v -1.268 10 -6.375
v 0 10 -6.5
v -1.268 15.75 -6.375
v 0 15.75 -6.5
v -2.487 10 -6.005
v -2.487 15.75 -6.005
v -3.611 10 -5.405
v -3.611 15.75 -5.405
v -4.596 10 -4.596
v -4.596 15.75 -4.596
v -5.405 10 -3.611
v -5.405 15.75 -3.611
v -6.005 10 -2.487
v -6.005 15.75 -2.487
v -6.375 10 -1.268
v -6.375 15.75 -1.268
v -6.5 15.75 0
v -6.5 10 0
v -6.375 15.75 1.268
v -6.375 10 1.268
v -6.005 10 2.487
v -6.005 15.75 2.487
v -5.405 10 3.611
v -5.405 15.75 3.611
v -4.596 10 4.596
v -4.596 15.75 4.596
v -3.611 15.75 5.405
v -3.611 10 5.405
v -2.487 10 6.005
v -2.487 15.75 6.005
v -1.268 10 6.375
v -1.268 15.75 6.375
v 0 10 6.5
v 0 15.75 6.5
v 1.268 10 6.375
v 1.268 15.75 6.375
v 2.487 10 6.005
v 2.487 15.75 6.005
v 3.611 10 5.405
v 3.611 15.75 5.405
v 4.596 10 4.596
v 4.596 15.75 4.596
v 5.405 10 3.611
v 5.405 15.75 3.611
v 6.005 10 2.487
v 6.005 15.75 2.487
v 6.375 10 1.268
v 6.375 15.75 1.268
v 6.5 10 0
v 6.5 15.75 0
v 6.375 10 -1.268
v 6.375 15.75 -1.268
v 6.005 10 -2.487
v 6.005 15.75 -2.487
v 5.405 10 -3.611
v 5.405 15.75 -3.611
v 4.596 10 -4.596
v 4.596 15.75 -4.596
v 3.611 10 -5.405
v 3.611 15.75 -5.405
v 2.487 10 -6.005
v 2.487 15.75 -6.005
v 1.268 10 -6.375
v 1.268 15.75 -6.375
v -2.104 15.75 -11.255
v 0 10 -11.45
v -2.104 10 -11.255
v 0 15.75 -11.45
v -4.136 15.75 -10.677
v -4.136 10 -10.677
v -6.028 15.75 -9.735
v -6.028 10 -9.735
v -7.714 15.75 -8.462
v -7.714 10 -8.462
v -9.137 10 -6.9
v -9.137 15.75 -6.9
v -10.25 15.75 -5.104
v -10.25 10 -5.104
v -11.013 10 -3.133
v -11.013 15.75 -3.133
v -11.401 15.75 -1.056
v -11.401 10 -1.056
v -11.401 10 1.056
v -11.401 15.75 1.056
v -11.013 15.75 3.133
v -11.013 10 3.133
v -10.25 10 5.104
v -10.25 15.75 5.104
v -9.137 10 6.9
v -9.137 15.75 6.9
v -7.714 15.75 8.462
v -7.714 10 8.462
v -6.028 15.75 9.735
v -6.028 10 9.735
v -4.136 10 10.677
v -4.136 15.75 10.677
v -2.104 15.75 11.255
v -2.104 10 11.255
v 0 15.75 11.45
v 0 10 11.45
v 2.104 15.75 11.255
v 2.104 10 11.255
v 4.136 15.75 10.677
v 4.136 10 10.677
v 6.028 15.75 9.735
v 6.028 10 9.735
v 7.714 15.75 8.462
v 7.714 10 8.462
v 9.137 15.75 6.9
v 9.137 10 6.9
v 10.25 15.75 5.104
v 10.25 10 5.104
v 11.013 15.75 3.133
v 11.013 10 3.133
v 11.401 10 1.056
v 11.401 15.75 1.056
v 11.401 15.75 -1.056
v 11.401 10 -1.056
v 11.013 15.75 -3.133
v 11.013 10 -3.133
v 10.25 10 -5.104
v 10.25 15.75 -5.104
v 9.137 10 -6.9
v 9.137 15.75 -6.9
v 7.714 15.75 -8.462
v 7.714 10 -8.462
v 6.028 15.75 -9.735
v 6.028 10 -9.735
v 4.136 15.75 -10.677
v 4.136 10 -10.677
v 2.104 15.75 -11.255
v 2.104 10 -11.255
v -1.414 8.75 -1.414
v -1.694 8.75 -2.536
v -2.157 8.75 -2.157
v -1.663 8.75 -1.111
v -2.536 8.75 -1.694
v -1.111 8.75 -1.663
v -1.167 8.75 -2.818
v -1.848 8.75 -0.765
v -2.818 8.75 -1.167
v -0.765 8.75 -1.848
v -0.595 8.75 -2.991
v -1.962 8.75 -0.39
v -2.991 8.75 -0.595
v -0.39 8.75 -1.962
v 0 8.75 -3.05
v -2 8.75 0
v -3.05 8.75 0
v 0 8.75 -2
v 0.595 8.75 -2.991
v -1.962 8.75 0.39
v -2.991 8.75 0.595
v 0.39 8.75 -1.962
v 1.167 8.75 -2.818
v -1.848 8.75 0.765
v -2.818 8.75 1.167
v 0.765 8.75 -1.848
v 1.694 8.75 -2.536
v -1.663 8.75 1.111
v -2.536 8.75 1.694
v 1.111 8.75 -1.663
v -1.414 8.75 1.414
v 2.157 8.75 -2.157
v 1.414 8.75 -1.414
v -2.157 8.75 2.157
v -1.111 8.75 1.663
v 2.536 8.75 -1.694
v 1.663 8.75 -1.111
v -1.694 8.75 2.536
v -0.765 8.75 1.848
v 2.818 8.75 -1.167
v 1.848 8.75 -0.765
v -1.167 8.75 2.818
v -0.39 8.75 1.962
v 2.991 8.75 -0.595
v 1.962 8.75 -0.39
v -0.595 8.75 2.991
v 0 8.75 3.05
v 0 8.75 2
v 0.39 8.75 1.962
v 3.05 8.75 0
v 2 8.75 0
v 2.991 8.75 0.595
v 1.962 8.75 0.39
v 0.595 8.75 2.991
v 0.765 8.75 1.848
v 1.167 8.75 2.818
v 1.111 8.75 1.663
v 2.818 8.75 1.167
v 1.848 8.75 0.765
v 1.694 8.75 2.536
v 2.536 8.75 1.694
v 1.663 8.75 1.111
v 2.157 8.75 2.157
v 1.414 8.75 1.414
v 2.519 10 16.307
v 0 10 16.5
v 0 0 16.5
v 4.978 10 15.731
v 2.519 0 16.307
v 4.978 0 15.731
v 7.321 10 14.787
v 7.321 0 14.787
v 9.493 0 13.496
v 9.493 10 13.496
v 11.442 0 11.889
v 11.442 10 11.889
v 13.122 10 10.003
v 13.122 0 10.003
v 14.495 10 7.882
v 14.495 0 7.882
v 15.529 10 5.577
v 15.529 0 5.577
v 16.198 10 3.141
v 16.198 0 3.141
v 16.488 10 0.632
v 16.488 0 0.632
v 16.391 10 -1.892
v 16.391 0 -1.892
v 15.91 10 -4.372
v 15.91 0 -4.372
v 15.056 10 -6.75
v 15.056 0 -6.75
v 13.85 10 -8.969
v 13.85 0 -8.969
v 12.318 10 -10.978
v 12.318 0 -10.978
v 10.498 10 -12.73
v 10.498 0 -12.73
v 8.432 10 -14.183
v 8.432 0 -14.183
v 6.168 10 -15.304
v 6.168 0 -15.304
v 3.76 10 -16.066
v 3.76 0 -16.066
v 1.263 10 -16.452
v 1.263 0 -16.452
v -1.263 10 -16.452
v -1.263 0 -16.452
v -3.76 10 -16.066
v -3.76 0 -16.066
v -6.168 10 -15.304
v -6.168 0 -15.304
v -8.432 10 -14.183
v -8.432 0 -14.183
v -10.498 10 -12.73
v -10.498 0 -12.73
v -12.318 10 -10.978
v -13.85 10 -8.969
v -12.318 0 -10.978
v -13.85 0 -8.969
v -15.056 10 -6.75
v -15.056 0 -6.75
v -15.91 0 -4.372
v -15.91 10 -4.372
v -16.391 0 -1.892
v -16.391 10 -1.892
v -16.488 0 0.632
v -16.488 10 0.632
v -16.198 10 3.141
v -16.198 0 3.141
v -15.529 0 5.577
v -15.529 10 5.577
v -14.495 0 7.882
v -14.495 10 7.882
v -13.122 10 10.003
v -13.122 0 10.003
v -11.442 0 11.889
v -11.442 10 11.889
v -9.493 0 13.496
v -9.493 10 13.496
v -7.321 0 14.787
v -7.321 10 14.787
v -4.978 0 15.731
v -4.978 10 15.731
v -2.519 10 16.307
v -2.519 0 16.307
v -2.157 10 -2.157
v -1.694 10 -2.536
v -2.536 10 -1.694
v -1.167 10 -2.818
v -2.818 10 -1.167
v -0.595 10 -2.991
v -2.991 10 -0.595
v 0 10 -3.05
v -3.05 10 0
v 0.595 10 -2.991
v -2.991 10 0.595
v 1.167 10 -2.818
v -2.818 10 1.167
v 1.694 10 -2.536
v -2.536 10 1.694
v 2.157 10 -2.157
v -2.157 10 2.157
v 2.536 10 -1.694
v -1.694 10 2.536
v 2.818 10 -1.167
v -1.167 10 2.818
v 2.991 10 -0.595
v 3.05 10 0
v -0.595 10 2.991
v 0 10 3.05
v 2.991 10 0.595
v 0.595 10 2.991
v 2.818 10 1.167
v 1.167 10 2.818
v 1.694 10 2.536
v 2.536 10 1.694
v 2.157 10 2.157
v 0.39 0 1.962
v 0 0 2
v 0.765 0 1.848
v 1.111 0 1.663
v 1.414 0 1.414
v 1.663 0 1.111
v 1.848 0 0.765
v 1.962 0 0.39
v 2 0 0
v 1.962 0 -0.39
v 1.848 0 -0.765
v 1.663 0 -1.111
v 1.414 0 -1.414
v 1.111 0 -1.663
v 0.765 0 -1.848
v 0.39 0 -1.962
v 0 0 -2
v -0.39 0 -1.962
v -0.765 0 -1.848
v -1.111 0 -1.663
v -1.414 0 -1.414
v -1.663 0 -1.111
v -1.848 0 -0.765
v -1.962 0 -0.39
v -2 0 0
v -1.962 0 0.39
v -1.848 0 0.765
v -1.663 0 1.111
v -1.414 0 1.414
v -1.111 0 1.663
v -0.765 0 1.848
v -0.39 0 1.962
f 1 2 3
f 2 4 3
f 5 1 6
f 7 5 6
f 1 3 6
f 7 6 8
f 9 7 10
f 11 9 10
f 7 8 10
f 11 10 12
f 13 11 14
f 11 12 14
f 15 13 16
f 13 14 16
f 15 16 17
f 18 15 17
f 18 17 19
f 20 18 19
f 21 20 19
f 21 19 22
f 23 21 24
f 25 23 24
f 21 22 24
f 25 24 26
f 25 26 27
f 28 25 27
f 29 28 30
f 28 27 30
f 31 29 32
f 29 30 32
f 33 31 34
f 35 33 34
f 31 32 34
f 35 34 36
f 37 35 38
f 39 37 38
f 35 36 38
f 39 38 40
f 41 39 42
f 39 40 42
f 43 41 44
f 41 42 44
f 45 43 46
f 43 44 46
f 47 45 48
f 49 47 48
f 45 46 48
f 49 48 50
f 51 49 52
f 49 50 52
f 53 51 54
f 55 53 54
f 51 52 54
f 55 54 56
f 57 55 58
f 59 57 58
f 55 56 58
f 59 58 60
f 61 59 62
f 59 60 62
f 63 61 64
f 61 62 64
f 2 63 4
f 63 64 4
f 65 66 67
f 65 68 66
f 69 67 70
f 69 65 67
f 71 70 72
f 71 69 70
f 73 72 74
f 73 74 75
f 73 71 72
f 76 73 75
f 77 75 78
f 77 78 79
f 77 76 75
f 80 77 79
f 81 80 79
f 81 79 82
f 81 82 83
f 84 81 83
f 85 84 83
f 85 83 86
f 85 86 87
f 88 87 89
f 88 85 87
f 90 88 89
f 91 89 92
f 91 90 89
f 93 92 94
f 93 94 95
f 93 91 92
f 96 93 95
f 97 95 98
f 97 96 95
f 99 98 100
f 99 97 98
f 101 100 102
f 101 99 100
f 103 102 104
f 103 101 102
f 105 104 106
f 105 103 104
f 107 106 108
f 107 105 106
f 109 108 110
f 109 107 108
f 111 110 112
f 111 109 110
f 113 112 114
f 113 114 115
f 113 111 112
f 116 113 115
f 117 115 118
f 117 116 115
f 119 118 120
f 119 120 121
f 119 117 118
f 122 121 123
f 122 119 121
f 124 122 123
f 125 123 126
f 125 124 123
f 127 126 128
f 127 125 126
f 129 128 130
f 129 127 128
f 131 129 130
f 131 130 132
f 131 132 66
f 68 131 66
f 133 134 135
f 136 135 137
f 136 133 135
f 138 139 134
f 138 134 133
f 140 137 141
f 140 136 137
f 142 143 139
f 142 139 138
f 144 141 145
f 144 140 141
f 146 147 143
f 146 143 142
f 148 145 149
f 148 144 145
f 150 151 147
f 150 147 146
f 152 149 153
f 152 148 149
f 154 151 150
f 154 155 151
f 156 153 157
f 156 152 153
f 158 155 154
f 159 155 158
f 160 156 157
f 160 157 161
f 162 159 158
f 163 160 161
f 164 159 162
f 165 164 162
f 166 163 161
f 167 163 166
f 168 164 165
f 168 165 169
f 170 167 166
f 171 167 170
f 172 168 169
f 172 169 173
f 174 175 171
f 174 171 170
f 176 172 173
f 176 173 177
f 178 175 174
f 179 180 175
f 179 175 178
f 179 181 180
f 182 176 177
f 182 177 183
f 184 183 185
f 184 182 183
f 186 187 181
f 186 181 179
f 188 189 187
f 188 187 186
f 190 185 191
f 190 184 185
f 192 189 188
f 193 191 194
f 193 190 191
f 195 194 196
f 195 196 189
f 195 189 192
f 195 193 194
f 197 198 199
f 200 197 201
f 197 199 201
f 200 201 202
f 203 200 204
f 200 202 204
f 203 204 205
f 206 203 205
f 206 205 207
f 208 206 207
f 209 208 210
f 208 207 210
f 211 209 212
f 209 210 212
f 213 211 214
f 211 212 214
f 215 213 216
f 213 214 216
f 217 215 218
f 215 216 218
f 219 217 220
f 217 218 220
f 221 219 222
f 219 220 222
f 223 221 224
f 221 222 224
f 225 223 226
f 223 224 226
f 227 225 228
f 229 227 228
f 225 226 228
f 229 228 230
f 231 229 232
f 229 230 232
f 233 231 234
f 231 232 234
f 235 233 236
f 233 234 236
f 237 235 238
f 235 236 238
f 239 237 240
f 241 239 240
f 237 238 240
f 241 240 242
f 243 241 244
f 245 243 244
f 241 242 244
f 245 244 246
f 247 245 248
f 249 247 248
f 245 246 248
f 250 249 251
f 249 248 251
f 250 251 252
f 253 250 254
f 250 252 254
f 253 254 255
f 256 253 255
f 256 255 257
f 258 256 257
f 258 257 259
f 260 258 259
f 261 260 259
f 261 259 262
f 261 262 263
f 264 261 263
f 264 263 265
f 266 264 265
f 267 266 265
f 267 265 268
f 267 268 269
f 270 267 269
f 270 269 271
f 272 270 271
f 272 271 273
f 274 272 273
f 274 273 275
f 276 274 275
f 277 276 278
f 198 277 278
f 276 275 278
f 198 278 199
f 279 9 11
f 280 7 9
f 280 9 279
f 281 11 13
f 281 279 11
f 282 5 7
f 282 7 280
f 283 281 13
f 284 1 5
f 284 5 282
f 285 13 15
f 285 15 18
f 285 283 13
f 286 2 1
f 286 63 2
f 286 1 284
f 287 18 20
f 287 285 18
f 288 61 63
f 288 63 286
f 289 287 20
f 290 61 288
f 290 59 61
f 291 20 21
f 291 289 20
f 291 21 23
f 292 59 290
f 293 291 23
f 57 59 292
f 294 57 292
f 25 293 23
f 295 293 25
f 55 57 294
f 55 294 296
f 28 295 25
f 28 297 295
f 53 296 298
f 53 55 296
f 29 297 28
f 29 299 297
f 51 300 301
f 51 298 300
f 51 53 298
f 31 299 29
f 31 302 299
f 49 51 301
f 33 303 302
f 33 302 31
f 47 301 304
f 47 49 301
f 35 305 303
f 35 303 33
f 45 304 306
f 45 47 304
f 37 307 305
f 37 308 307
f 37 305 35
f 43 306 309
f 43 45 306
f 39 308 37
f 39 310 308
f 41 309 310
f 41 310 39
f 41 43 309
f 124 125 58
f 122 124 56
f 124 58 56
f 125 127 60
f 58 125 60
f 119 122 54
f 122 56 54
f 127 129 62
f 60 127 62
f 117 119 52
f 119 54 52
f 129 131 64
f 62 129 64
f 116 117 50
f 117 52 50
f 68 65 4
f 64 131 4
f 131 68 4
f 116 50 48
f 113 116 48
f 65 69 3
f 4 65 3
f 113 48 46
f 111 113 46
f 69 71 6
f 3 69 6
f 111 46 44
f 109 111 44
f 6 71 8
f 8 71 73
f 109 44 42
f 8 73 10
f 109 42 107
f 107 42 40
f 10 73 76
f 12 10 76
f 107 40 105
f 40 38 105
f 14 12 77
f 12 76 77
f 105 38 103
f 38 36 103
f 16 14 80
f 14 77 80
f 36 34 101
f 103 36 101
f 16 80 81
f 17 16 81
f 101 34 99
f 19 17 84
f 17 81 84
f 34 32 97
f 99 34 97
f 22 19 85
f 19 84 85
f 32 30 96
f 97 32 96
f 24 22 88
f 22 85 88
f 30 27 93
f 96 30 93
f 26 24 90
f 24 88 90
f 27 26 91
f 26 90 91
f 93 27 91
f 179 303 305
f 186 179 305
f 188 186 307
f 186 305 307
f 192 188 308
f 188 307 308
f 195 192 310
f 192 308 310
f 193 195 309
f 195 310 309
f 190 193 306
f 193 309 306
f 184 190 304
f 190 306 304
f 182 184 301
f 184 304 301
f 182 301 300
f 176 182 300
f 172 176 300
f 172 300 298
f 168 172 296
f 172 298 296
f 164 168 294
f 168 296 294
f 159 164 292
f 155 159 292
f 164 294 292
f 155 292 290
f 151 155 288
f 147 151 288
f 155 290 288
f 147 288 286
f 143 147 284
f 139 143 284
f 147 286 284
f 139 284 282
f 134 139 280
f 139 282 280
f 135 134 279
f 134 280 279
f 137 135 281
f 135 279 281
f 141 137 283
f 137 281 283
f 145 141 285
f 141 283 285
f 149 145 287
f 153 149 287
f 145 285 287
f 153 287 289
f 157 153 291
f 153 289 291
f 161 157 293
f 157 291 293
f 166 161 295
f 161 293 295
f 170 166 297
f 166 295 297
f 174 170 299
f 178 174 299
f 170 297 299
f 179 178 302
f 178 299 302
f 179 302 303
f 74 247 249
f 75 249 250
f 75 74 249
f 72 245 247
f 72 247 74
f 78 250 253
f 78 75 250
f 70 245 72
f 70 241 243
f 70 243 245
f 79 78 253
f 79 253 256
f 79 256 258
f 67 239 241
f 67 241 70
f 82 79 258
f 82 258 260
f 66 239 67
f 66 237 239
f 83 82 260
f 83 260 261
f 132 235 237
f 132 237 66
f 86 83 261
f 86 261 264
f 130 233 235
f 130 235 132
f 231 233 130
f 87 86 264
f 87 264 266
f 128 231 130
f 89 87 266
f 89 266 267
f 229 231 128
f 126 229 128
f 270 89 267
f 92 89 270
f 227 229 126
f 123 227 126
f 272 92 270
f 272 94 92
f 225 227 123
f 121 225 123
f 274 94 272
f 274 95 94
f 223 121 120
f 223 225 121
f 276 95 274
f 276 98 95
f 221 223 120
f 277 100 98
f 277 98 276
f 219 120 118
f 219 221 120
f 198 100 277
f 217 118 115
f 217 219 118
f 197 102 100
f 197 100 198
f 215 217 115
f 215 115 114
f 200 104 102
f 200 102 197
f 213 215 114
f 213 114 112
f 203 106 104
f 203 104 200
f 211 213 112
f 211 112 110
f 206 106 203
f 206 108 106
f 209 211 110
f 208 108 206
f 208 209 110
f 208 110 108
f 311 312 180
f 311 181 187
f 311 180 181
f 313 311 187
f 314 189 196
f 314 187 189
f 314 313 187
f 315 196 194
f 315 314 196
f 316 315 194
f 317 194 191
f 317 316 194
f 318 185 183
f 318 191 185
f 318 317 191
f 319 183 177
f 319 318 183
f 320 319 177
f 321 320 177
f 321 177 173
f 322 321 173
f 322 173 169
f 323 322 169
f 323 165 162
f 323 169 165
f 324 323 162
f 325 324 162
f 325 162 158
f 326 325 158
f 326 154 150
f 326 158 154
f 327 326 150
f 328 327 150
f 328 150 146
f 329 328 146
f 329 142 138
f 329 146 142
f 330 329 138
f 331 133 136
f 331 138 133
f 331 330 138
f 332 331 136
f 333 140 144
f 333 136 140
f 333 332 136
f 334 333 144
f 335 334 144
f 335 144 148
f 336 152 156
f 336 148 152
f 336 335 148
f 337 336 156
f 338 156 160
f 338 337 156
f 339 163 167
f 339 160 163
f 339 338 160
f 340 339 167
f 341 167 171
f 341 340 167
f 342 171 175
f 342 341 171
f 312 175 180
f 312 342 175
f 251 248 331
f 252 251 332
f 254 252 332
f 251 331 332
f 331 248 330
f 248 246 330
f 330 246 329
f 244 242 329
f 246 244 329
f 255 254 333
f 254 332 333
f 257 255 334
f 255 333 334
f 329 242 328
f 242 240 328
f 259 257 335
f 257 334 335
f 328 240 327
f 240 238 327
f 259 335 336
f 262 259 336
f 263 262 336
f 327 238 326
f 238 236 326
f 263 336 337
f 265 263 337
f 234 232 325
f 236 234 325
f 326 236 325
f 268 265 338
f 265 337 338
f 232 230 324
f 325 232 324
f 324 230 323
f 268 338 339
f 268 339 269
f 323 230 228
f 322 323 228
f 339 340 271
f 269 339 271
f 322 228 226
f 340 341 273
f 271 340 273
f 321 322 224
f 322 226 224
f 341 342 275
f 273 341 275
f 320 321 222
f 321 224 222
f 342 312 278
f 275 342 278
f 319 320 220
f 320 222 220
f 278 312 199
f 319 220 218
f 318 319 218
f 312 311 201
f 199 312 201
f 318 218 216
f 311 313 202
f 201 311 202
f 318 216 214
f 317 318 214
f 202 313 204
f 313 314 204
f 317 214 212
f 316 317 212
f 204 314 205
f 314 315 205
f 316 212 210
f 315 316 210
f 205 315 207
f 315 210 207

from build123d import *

# Parameters (mm, degrees)
SKETCH1_R               = 16.5
BOSS_EXTRUDE1_DEPTH     = 10
SKETCH2_R               = 3.05
CUT_EXTRUDE1_DEPTH      = 1.25
SKETCH4_W               = 4.95
SKETCH4_H               = 5.75
CUT_EXTRUDE2_DEPTH      = 25.921125577
CUT_EXTRUDE2_DEPTH_BACK = 25.921125577
SKETCH5_R               = 2


with BuildPart() as part:
    # Sketch1 → Boss-Extrude1 (new body)
    with BuildSketch(Plane(origin=(0, 0, 0), x_dir=(1, 0, 0), z_dir=(0, 1, 0))):
        with Locations(Location((0, 0, 0), (0, 0, 270))):
            Circle(SKETCH1_R)
    extrude(amount=BOSS_EXTRUDE1_DEPTH)

    # Sketch2 → Cut-Extrude1 (cut)
    with BuildSketch(Plane(origin=(0, 10, 0), x_dir=(1, 0, 0), z_dir=(0, 1, 0))):
        with Locations(Location((0, 0, 0), (0, 0, 270))):
            Circle(SKETCH2_R)
    extrude(amount=-CUT_EXTRUDE1_DEPTH, mode=Mode.SUBTRACT)

    # Sketch4 → Revolve1 (revolve)
    with BuildSketch(Plane.XY, mode=Mode.PRIVATE) as revolve1_sk:
        with Locations((8.975, 12.875)):
            Rectangle(SKETCH4_W, SKETCH4_H)
    revolve(revolve1_sk.sketch.rotate(Axis((0, -0.517946451, 0), (0, 1, 0)), 90), axis=Axis((0, -0.517946451, 0), (0, 1, 0)))

    # Sketch5 → Cut-Extrude2 (cut, two sides: drawn at the far end of the back side and taken through both)
    with BuildSketch(Plane(origin=(0, 8.75, 0), x_dir=(1, 0, 0), z_dir=(0, 1, 0)).offset(-CUT_EXTRUDE2_DEPTH_BACK)):
        with Locations(Location((0, 0, 0), (0, 0, 270))):
            Circle(SKETCH5_R)
    extrude(amount=CUT_EXTRUDE2_DEPTH + CUT_EXTRUDE2_DEPTH_BACK, mode=Mode.SUBTRACT)


solid = part.part
